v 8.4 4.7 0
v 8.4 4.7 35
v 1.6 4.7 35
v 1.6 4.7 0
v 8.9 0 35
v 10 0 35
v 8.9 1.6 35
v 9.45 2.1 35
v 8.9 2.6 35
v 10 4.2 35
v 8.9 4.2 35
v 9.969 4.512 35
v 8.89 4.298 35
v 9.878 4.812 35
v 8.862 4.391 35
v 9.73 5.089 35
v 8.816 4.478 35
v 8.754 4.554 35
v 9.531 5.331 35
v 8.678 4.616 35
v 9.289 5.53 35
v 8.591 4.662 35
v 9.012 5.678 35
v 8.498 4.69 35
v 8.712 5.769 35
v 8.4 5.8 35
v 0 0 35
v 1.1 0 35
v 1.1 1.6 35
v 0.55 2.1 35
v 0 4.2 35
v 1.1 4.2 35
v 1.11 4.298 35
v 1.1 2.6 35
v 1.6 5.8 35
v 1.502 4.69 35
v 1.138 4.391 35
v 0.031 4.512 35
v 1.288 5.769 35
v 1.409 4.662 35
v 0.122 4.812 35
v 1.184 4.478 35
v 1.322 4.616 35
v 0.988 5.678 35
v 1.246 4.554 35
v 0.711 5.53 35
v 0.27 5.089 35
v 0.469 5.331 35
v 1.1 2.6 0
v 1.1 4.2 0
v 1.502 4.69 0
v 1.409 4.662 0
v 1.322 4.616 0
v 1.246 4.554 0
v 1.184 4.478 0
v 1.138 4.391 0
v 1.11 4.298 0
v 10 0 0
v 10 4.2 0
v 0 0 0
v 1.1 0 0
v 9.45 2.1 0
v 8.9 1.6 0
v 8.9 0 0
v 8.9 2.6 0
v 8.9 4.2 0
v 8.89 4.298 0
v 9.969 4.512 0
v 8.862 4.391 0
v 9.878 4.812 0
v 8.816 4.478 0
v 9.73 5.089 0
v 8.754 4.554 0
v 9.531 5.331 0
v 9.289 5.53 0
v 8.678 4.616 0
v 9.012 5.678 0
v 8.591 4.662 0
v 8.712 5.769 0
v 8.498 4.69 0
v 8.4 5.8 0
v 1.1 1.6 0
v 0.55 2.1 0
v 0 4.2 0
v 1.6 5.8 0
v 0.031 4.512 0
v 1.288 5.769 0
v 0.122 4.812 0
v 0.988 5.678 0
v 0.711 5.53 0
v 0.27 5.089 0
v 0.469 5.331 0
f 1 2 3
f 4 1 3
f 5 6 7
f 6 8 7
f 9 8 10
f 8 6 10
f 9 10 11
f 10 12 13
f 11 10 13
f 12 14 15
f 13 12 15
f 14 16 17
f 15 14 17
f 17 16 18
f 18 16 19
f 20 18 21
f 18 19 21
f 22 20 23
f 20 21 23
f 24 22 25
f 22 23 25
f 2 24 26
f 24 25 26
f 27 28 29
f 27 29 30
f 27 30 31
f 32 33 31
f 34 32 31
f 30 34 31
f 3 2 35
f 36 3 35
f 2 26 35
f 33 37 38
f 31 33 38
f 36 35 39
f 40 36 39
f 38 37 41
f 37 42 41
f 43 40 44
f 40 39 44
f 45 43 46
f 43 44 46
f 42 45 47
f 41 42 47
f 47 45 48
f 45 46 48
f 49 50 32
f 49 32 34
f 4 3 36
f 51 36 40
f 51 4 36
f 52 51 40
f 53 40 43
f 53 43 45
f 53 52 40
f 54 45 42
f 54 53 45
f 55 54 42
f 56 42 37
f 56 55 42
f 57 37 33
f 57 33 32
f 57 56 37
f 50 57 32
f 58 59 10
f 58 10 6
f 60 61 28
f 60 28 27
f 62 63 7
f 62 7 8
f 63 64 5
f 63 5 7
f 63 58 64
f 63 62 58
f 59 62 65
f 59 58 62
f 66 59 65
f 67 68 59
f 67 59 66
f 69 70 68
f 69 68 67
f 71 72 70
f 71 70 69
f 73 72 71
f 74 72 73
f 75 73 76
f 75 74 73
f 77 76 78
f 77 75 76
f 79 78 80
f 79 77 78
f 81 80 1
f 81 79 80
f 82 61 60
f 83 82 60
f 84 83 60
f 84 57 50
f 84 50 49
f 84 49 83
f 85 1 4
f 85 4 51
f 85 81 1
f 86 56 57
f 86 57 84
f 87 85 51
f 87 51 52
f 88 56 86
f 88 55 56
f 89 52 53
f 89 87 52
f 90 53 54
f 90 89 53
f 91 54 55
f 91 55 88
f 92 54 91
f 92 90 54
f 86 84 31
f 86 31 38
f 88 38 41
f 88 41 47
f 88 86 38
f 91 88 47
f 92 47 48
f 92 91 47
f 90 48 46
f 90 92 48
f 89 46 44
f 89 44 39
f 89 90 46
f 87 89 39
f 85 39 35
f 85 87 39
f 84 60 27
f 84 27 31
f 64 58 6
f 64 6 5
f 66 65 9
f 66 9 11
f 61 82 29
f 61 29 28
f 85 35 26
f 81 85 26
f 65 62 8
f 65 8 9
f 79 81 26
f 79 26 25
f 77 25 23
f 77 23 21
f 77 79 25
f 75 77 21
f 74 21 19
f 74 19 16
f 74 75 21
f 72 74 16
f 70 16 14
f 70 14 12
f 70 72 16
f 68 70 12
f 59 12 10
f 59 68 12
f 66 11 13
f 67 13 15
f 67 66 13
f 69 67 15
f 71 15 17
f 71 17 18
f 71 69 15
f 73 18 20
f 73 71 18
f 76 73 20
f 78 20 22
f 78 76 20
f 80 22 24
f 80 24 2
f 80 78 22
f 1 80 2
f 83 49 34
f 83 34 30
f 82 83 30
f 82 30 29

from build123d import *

# Parameters (mm, degrees)
EXTRUSION1_DEPTH = 35


with BuildPart() as part:
    # Esquisse1 → Extrusion1 (new body)
    with BuildSketch(Plane.XY):
        with BuildLine():
            Line((1.6, 5.8), (8.4, 5.8))
            ThreePointArc((8.4, 5.8), (9.53137085, 5.33137085), (10, 4.2))
            Line((10, 4.2), (10, 0))
            Line((10, 0), (8.9, 0))
            Line((8.9, 0), (8.9, 1.6))
            Line((8.9, 1.6), (9.45, 2.1))
            Line((9.45, 2.1), (8.9, 2.6))
            Line((8.9, 2.6), (8.9, 4.2))
            ThreePointArc((8.9, 4.2), (8.753553391, 4.553553391), (8.4, 4.7))
            Line((8.4, 4.7), (1.6, 4.7))
            ThreePointArc((1.6, 4.7), (1.246446609, 4.553553391), (1.1, 4.2))
            Line((1.1, 4.2), (1.1, 2.6))
            Line((1.1, 2.6), (0.55, 2.1))
            Line((0.55, 2.1), (1.1, 1.6))
            Line((1.1, 1.6), (1.1, 0))
            Line((1.1, 0), (0, 0))
            Line((0, 0), (0, 4.2))
            ThreePointArc((0, 4.2), (0.46862915, 5.33137085), (1.6, 5.8))
        make_face()
    extrude(amount=EXTRUSION1_DEPTH)


solid = part.part
